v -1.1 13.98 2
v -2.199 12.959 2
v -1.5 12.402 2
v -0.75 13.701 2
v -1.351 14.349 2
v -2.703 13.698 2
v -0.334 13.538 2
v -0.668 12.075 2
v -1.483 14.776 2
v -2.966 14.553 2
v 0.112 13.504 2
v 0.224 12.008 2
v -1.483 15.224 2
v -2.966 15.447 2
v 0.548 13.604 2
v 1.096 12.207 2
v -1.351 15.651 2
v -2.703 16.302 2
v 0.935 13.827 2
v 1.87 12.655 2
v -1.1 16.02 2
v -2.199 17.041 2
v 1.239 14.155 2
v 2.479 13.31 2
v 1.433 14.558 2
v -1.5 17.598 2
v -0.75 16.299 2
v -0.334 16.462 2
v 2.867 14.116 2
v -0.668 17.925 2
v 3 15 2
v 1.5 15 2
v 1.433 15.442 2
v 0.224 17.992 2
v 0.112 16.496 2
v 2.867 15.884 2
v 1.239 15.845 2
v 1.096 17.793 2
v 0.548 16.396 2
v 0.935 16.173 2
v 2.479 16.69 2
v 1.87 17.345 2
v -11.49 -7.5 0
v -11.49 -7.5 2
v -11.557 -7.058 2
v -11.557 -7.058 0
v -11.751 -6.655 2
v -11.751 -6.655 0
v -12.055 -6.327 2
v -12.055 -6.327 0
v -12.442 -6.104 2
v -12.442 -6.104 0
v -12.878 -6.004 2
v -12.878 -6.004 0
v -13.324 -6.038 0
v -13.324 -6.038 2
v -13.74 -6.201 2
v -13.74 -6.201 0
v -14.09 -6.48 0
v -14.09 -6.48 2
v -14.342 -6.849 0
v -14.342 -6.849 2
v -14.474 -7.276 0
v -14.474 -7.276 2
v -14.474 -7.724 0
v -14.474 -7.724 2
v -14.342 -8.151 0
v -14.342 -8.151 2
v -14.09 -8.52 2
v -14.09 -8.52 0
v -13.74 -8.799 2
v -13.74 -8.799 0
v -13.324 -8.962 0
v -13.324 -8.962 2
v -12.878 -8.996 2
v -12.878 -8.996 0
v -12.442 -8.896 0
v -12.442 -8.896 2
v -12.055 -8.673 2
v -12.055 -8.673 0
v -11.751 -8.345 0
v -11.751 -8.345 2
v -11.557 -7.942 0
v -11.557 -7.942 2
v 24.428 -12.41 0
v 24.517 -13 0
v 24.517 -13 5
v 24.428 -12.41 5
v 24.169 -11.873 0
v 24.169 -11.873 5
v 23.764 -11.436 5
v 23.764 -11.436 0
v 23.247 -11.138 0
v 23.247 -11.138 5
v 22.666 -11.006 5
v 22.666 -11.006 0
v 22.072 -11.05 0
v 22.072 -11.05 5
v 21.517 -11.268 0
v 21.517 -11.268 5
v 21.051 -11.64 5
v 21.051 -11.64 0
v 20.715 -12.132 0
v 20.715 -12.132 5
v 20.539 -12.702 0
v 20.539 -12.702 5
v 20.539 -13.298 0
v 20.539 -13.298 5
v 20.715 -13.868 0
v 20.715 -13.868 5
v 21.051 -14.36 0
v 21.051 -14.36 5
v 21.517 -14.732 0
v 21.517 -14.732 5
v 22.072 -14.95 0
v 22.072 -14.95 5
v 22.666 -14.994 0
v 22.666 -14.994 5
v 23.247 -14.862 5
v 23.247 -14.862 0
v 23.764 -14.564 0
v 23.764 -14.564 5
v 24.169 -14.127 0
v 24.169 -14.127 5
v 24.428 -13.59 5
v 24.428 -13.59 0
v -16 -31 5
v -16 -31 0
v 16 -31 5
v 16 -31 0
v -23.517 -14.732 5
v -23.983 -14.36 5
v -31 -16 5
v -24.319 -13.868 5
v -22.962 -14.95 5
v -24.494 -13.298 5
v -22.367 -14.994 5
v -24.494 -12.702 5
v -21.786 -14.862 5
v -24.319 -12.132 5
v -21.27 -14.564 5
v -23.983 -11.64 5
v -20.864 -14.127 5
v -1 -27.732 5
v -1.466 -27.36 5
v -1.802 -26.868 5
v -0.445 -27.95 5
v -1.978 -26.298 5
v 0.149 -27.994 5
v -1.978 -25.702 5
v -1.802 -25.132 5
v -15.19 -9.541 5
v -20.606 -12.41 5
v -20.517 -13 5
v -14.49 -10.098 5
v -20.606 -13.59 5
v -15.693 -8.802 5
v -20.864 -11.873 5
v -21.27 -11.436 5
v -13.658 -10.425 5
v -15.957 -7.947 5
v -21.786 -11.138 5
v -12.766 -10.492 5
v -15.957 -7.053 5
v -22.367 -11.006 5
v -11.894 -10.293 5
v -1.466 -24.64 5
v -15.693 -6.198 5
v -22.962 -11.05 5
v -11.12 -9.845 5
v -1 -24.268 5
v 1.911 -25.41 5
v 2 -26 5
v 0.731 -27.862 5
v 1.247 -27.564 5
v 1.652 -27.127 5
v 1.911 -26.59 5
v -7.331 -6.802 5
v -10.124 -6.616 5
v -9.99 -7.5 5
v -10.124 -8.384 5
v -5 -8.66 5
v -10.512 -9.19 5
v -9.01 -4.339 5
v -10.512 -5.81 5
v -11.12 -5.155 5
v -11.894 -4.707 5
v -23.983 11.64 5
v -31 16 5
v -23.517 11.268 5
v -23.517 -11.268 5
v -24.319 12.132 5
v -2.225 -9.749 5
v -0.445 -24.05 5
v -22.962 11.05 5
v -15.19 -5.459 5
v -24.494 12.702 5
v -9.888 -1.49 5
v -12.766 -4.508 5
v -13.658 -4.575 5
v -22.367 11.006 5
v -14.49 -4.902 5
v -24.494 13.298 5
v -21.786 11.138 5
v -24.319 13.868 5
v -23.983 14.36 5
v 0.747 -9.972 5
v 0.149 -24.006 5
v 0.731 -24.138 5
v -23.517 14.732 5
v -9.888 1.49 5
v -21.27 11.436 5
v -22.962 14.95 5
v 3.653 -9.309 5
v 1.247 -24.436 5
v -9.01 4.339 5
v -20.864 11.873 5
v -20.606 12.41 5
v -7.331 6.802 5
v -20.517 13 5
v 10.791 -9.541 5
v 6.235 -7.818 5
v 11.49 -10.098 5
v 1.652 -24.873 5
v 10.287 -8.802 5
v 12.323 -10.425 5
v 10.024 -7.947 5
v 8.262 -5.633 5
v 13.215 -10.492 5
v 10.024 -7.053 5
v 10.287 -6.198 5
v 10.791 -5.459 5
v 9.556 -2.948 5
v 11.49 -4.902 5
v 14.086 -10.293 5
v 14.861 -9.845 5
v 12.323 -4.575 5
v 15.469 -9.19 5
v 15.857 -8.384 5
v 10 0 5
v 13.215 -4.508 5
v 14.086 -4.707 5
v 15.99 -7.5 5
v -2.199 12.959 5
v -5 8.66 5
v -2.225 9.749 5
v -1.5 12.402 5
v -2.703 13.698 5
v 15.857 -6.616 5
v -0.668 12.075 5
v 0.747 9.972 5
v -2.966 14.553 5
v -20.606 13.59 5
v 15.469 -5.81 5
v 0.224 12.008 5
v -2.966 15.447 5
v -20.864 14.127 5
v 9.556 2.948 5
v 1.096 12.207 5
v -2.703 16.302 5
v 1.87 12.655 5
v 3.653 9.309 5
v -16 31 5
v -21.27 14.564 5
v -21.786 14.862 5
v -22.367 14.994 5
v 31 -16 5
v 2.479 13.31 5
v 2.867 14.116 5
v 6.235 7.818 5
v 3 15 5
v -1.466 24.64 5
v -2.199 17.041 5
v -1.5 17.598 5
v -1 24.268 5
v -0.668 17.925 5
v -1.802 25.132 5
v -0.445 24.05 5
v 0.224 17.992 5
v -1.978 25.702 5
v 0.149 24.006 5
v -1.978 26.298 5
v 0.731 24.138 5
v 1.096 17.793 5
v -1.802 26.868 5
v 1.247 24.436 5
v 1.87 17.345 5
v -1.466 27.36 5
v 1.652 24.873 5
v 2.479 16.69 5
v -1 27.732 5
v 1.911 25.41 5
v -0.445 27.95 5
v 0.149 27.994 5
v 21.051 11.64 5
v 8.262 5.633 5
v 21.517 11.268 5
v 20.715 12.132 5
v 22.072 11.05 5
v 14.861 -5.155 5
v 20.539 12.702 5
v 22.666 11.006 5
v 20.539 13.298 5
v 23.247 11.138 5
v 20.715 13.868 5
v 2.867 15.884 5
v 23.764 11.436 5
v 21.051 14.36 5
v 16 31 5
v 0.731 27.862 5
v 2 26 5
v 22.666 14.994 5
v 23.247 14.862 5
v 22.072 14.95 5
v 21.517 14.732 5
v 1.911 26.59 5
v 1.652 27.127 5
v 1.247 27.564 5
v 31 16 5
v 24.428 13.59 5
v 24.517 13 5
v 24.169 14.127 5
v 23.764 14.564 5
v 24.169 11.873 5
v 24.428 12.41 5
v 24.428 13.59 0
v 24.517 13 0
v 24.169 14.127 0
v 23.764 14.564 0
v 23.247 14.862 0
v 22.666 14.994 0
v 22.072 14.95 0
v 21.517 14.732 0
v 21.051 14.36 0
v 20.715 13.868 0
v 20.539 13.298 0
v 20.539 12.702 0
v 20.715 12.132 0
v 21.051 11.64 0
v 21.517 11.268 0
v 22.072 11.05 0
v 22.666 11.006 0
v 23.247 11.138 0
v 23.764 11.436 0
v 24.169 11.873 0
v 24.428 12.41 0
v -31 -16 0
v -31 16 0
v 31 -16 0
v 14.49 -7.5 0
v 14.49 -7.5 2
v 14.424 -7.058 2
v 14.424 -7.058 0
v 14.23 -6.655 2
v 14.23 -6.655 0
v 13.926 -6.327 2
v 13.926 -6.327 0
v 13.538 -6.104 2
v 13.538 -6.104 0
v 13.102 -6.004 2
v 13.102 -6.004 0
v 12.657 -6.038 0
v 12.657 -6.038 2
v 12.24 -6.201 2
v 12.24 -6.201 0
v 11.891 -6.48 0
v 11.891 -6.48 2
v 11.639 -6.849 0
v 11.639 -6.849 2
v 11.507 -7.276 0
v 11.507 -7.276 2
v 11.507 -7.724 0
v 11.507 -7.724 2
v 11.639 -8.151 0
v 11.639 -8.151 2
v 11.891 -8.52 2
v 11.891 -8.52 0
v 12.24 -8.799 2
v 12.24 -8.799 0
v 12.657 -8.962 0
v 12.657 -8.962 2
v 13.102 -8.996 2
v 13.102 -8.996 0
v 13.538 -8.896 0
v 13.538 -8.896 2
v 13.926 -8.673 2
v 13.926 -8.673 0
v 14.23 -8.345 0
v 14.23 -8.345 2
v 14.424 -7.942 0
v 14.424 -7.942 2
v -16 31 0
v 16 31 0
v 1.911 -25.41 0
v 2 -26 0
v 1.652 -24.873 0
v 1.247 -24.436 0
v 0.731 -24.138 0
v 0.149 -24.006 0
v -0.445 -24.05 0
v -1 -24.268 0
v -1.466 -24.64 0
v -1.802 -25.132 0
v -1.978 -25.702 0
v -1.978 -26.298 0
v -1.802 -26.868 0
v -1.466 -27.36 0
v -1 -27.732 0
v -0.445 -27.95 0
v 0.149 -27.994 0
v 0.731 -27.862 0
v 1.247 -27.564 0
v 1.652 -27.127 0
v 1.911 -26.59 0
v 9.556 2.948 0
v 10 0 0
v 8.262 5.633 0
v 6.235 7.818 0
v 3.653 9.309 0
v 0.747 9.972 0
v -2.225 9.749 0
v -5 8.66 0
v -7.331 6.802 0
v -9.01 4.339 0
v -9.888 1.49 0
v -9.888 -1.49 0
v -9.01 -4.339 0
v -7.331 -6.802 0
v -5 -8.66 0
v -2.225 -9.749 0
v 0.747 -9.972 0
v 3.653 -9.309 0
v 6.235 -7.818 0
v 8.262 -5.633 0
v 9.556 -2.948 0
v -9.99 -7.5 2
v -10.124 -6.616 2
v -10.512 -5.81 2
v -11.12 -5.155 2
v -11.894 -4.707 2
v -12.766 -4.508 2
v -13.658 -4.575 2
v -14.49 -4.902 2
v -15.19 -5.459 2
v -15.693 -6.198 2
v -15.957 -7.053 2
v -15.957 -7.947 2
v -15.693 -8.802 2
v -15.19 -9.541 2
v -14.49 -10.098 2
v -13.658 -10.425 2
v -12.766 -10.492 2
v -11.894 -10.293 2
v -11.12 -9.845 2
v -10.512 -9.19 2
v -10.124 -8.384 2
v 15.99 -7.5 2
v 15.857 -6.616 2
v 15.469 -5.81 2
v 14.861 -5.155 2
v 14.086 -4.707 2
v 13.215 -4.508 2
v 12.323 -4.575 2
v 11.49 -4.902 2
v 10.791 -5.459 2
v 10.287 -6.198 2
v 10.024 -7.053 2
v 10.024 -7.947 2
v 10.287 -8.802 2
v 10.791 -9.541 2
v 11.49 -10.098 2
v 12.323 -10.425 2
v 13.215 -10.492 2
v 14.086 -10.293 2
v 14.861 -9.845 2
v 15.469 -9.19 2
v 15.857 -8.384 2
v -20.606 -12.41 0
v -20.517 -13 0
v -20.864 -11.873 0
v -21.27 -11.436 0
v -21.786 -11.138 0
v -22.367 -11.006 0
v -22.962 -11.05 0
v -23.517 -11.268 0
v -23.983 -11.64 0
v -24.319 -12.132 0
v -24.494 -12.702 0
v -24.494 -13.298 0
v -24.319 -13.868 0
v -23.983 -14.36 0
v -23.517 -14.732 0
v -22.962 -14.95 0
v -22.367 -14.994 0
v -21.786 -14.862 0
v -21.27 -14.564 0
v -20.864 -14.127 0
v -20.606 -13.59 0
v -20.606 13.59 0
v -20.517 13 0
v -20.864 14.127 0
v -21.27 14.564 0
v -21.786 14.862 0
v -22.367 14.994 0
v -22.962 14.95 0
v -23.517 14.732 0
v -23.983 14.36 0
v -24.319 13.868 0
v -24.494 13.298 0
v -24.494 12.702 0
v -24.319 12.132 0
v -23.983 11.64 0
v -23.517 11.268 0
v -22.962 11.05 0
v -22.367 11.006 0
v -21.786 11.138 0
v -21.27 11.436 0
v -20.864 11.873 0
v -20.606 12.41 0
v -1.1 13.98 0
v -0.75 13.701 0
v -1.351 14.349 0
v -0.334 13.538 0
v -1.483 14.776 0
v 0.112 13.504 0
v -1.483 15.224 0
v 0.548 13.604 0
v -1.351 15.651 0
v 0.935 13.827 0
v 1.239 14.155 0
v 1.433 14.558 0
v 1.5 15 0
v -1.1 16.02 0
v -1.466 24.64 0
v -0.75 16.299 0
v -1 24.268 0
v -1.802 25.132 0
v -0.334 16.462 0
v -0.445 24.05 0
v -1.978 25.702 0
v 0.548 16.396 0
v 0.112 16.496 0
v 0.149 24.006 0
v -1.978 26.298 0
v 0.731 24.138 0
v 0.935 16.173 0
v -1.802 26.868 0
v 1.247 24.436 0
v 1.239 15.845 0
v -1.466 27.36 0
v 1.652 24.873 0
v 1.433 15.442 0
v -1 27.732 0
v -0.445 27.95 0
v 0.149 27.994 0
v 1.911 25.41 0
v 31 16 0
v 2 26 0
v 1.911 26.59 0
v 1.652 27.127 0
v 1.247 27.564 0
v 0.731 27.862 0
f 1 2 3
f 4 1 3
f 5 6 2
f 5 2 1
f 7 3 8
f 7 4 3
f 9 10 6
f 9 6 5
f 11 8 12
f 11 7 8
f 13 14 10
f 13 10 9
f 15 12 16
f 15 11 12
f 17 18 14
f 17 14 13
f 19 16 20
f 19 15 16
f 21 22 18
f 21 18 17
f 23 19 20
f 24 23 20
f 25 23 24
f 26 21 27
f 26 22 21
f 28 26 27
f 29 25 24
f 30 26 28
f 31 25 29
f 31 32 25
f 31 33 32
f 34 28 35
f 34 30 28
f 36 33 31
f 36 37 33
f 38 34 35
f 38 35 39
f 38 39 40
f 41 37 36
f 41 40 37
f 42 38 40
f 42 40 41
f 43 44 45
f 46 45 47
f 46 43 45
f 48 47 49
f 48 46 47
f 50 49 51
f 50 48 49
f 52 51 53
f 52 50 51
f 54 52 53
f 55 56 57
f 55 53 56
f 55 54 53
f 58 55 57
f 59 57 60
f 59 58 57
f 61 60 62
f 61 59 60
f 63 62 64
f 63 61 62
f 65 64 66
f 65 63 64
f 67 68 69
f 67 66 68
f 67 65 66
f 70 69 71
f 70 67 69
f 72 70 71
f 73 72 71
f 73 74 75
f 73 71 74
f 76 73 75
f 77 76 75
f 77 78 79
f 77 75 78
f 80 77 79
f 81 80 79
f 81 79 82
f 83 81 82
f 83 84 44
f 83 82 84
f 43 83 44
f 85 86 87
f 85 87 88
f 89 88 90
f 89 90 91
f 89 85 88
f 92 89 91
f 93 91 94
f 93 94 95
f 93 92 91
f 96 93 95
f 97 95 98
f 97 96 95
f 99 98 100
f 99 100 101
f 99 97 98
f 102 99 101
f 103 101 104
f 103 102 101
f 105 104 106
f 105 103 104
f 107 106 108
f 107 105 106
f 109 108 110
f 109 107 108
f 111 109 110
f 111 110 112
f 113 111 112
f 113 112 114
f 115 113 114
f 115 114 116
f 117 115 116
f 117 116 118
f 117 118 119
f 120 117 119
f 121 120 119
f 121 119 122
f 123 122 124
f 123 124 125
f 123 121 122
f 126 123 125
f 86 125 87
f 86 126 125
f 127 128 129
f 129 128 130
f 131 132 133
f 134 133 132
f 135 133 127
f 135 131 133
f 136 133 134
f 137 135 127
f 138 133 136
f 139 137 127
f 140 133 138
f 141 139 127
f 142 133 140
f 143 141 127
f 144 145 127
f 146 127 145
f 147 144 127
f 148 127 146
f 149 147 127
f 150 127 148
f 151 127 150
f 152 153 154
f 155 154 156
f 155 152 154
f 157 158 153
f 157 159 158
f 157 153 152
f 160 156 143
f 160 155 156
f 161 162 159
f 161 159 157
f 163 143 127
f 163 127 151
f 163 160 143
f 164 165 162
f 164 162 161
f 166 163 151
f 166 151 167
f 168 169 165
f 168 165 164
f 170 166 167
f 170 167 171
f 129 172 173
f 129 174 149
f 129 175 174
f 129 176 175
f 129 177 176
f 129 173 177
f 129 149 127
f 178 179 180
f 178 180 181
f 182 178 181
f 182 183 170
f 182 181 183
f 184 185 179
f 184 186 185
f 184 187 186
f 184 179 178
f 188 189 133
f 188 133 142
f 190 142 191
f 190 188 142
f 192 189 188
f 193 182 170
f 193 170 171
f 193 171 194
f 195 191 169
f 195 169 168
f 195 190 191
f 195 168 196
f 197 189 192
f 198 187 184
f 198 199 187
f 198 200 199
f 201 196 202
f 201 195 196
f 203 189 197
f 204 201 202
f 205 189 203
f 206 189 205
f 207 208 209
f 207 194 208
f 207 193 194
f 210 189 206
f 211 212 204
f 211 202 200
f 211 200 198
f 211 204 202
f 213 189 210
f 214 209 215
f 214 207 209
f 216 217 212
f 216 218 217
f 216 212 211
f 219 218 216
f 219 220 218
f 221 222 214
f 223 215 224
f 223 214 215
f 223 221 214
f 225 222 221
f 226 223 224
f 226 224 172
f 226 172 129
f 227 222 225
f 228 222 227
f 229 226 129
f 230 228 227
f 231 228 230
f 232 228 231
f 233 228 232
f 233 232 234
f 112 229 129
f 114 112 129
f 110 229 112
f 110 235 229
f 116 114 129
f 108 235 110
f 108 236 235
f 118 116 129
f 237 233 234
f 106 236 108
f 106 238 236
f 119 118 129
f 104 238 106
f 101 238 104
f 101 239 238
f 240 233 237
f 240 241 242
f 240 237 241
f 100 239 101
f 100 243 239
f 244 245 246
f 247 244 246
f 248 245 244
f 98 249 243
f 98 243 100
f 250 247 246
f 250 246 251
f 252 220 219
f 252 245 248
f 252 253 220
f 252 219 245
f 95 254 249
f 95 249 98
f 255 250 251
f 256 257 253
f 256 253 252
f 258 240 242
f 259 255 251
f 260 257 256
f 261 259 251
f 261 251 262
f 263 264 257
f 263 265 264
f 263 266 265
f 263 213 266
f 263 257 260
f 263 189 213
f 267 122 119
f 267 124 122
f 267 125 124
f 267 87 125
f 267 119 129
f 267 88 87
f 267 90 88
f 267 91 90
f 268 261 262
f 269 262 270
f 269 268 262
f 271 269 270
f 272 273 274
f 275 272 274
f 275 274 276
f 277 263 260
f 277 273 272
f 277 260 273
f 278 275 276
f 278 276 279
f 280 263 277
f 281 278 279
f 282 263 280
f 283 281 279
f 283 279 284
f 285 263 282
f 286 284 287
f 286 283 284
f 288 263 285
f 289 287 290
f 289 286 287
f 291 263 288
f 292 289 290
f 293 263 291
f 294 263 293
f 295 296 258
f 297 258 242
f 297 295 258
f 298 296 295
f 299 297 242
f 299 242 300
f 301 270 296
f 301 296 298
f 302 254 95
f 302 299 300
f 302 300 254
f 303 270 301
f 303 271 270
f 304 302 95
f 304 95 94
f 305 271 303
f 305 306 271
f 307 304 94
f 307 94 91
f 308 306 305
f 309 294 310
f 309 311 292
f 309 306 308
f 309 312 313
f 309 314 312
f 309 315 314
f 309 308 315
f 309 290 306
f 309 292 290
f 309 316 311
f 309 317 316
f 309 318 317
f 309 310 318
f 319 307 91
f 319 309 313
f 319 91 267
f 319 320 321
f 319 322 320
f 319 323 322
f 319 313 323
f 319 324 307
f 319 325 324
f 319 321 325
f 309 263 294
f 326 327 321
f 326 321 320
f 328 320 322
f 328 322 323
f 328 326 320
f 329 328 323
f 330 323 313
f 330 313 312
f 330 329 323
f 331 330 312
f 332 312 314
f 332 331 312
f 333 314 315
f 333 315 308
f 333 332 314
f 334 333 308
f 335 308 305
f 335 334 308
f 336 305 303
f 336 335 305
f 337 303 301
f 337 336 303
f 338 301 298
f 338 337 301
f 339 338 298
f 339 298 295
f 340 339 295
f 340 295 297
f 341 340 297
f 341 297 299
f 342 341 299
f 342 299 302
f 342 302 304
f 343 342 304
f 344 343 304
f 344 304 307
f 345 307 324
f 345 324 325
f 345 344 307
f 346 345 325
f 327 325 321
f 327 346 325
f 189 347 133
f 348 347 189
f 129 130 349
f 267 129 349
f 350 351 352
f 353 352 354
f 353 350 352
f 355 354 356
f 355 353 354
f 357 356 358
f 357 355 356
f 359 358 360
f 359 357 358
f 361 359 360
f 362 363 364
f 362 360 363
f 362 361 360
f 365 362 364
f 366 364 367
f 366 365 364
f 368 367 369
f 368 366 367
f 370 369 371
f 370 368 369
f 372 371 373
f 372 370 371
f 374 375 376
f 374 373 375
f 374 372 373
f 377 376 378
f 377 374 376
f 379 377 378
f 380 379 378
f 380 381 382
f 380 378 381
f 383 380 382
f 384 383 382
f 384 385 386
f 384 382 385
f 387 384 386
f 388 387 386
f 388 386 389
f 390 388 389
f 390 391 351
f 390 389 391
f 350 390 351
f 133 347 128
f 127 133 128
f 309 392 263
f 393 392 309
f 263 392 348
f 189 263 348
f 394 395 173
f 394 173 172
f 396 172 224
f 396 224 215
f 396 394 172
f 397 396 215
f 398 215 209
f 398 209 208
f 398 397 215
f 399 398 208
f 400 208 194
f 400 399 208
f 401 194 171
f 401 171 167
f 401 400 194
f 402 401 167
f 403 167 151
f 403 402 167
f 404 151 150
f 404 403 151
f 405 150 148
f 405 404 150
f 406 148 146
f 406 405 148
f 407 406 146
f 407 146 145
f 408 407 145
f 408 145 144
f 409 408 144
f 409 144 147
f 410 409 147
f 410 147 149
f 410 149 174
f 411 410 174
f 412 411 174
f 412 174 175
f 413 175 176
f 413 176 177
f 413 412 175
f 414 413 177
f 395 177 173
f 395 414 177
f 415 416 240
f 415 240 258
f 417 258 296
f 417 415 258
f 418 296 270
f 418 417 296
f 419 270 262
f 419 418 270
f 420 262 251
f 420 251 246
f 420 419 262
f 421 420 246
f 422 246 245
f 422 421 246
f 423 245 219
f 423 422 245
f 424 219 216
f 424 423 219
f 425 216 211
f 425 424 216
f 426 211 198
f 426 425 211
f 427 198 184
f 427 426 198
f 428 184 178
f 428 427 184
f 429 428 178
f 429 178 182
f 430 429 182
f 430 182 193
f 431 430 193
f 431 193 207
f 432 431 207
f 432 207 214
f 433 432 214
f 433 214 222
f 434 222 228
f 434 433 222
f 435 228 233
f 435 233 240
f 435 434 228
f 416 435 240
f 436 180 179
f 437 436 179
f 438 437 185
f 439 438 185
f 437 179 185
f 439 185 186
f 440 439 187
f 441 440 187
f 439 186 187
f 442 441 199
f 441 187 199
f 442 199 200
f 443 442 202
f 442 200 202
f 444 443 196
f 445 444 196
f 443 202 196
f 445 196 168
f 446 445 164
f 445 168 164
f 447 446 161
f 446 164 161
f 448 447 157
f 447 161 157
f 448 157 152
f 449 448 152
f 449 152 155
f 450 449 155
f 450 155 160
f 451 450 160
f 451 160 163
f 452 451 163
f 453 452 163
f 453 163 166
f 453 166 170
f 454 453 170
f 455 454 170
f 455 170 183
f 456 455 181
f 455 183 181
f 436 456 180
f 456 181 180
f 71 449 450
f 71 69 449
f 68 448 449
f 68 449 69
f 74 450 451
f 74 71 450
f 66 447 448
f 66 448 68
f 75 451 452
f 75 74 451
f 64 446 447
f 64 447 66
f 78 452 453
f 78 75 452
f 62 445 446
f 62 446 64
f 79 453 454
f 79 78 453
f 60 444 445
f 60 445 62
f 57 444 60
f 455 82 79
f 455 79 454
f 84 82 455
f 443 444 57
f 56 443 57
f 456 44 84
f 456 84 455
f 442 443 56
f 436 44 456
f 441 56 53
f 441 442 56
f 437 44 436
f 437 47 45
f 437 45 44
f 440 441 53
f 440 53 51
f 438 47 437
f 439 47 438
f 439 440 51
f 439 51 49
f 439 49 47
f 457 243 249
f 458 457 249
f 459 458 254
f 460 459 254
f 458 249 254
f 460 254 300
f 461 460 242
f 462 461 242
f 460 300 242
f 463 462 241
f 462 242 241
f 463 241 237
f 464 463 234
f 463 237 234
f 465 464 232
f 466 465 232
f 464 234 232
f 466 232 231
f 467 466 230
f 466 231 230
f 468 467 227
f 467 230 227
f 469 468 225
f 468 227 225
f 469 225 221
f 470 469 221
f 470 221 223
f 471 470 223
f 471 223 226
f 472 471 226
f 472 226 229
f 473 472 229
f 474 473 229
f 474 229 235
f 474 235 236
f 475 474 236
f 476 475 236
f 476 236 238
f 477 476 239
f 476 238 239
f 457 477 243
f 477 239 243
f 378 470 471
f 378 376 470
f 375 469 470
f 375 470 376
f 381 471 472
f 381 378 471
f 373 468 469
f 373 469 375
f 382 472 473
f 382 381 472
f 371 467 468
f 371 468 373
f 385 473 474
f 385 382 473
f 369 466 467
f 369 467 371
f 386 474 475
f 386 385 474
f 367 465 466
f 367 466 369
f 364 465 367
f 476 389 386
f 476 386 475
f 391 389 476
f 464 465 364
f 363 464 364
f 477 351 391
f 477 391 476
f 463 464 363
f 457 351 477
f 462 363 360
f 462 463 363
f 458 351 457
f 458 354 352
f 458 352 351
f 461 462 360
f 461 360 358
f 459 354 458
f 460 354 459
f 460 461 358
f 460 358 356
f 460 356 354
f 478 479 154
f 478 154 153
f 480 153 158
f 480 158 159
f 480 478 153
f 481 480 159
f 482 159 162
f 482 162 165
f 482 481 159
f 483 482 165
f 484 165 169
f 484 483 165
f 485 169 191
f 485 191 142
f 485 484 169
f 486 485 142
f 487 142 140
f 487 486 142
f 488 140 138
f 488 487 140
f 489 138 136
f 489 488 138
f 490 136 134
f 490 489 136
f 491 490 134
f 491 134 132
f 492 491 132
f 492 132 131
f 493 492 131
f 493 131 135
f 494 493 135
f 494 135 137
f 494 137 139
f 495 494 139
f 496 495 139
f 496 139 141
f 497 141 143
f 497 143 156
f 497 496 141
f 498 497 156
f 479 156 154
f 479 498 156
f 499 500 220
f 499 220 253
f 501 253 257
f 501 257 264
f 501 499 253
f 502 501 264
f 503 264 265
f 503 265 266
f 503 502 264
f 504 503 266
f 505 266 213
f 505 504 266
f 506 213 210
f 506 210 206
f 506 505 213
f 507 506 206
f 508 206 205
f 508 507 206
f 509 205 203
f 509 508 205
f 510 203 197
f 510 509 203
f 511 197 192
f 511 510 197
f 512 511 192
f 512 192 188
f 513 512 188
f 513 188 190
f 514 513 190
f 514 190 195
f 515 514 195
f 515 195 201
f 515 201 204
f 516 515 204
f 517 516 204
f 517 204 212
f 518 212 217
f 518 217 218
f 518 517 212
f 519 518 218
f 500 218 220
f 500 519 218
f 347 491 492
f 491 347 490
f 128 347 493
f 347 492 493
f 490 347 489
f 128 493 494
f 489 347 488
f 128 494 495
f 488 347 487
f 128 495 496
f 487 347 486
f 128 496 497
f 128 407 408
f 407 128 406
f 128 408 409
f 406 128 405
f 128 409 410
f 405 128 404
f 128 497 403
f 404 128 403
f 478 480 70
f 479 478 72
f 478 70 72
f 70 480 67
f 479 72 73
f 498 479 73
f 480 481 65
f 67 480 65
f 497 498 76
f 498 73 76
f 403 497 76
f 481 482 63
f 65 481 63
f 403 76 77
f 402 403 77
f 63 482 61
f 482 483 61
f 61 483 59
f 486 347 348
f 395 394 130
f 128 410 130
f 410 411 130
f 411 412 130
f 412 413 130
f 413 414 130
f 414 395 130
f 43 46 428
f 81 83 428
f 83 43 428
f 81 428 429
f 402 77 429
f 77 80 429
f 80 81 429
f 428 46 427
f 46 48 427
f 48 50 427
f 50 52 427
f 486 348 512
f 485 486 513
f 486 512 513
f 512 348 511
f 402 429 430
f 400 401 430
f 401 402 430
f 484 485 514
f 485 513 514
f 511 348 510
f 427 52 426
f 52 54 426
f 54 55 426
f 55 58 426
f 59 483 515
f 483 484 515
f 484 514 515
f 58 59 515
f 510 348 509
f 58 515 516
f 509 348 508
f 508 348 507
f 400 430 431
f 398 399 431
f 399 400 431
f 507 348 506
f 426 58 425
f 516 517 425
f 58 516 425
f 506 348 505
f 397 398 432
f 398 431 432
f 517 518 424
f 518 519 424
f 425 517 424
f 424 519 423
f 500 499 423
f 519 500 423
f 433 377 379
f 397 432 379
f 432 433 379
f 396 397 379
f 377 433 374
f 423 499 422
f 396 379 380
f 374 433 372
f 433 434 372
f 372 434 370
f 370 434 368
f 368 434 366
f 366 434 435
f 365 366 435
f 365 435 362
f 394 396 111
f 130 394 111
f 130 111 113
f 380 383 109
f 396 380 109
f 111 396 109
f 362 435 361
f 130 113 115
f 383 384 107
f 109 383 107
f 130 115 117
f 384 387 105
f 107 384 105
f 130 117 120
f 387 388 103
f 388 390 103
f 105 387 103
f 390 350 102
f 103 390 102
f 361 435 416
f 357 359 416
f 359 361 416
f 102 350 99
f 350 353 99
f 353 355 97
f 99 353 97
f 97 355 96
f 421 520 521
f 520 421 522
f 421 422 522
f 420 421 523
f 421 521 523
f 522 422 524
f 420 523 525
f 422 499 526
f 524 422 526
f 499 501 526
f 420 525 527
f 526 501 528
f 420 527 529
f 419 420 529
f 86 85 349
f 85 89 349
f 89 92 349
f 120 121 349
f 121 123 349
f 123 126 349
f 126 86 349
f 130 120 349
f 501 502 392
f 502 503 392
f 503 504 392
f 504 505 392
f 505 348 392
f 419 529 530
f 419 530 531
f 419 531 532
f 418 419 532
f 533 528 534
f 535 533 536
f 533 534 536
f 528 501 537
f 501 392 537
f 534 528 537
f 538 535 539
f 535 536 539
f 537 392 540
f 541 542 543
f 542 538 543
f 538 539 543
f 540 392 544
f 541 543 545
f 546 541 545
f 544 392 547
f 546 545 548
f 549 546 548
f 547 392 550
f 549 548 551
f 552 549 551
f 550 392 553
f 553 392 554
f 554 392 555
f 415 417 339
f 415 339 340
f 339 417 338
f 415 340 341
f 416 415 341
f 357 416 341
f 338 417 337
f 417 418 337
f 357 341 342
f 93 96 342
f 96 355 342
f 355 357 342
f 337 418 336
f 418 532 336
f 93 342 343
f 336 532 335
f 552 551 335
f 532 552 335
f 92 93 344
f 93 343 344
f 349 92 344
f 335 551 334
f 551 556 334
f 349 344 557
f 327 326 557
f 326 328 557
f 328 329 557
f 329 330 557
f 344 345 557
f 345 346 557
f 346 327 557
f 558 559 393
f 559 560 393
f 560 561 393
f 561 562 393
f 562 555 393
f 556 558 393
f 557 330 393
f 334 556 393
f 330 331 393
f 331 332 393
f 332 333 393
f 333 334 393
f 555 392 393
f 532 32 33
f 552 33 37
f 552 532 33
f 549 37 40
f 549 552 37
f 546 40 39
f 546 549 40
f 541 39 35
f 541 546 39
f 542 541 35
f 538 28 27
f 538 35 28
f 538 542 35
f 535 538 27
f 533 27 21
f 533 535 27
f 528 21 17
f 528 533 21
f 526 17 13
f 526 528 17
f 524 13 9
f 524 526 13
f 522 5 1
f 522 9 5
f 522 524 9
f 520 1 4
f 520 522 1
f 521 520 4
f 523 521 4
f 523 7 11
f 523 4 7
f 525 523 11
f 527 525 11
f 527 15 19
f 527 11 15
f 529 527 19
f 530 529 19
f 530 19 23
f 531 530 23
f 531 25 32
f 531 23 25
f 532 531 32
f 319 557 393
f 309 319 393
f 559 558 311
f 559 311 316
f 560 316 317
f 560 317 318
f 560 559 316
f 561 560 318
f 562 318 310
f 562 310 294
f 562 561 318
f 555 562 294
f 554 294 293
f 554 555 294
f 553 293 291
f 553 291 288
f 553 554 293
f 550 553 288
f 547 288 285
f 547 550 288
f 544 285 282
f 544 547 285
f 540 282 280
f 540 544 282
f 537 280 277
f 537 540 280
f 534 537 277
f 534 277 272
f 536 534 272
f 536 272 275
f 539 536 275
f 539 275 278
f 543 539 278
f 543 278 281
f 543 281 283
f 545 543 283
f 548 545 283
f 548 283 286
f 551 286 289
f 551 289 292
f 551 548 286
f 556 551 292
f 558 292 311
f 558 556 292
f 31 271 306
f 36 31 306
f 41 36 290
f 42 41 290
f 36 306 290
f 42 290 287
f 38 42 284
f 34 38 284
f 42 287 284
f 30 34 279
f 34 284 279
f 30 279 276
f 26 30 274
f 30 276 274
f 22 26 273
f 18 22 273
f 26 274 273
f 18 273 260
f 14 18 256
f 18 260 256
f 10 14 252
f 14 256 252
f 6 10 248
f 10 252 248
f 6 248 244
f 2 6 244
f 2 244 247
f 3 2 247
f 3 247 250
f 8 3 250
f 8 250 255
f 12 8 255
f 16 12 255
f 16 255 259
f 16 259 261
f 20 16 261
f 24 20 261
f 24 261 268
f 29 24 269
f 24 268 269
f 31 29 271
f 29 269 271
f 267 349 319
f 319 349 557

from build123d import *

# Parameters (mm, degrees)
SKETCH1_W           = 62
SKETCH1_H           = 62
SKETCH1_R           = 10
SKETCH1_R_2         = 2
SKETCH1_R_3         = 1.5
BOSS_EXTRUDE1_DEPTH = 5
CUT_EXTRUDE2_DEPTH  = 10
SKETCH4_R           = 3
CUT_EXTRUDE3_DEPTH  = 3


with BuildPart() as part:
    # Sketch1 → Boss-Extrude1 (new body)
    with BuildSketch(Plane.XY):
        Rectangle(SKETCH1_W, SKETCH1_H)
        Circle(SKETCH1_R, mode=Mode.SUBTRACT)
        with Locations((0, 26)):
            Circle(SKETCH1_R_2, mode=Mode.SUBTRACT)
        with Locations((0, 15)):
            Circle(SKETCH1_R_3, mode=Mode.SUBTRACT)
        with Locations((22.516660498, 13)):
            Circle(SKETCH1_R_2, mode=Mode.SUBTRACT)
        with Locations((22.516660498, -13)):
            Circle(SKETCH1_R_2, mode=Mode.SUBTRACT)
        with Locations((0, -26)):
            Circle(SKETCH1_R_2, mode=Mode.SUBTRACT)
        with Locations((-22.516660498, -13)):
            Circle(SKETCH1_R_2, mode=Mode.SUBTRACT)
        with Locations((-22.516660498, 13)):
            Circle(SKETCH1_R_2, mode=Mode.SUBTRACT)
        with Locations((12.990381057, -7.5)):
            Circle(SKETCH1_R_3, mode=Mode.SUBTRACT)
        with Locations((-12.990381057, -7.5)):
            Circle(SKETCH1_R_3, mode=Mode.SUBTRACT)
    extrude(amount=BOSS_EXTRUDE1_DEPTH)

    # Sketch3 → Cut-Extrude2 (cut)
    with BuildSketch(Plane(origin=(0, 0, 0), x_dir=(-1, 0, 0), z_dir=(0, 0, -1))):
        Polygon((-31, 31), (-31, 16), (-16, 31), align=None)
        Polygon((31, 31), (16, 31), (31, 16), align=None)
        Polygon((31, -31), (31, -16), (16, -31), align=None)
        Polygon((-31, -31), (-16, -31), (-31, -16), align=None)
    extrude(amount=-CUT_EXTRUDE2_DEPTH, mode=Mode.SUBTRACT)

    # Sketch4 → Cut-Extrude3 (cut)
    with BuildSketch(Plane.XY.offset(5)):
        with Locations((0, 15)):
            Circle(SKETCH4_R)
        with Locations((12.990381057, -7.5)):
            Circle(SKETCH4_R)
        with Locations((-12.990381057, -7.5)):
            Circle(SKETCH4_R)
    extrude(amount=-CUT_EXTRUDE3_DEPTH, mode=Mode.SUBTRACT)


solid = part.part
